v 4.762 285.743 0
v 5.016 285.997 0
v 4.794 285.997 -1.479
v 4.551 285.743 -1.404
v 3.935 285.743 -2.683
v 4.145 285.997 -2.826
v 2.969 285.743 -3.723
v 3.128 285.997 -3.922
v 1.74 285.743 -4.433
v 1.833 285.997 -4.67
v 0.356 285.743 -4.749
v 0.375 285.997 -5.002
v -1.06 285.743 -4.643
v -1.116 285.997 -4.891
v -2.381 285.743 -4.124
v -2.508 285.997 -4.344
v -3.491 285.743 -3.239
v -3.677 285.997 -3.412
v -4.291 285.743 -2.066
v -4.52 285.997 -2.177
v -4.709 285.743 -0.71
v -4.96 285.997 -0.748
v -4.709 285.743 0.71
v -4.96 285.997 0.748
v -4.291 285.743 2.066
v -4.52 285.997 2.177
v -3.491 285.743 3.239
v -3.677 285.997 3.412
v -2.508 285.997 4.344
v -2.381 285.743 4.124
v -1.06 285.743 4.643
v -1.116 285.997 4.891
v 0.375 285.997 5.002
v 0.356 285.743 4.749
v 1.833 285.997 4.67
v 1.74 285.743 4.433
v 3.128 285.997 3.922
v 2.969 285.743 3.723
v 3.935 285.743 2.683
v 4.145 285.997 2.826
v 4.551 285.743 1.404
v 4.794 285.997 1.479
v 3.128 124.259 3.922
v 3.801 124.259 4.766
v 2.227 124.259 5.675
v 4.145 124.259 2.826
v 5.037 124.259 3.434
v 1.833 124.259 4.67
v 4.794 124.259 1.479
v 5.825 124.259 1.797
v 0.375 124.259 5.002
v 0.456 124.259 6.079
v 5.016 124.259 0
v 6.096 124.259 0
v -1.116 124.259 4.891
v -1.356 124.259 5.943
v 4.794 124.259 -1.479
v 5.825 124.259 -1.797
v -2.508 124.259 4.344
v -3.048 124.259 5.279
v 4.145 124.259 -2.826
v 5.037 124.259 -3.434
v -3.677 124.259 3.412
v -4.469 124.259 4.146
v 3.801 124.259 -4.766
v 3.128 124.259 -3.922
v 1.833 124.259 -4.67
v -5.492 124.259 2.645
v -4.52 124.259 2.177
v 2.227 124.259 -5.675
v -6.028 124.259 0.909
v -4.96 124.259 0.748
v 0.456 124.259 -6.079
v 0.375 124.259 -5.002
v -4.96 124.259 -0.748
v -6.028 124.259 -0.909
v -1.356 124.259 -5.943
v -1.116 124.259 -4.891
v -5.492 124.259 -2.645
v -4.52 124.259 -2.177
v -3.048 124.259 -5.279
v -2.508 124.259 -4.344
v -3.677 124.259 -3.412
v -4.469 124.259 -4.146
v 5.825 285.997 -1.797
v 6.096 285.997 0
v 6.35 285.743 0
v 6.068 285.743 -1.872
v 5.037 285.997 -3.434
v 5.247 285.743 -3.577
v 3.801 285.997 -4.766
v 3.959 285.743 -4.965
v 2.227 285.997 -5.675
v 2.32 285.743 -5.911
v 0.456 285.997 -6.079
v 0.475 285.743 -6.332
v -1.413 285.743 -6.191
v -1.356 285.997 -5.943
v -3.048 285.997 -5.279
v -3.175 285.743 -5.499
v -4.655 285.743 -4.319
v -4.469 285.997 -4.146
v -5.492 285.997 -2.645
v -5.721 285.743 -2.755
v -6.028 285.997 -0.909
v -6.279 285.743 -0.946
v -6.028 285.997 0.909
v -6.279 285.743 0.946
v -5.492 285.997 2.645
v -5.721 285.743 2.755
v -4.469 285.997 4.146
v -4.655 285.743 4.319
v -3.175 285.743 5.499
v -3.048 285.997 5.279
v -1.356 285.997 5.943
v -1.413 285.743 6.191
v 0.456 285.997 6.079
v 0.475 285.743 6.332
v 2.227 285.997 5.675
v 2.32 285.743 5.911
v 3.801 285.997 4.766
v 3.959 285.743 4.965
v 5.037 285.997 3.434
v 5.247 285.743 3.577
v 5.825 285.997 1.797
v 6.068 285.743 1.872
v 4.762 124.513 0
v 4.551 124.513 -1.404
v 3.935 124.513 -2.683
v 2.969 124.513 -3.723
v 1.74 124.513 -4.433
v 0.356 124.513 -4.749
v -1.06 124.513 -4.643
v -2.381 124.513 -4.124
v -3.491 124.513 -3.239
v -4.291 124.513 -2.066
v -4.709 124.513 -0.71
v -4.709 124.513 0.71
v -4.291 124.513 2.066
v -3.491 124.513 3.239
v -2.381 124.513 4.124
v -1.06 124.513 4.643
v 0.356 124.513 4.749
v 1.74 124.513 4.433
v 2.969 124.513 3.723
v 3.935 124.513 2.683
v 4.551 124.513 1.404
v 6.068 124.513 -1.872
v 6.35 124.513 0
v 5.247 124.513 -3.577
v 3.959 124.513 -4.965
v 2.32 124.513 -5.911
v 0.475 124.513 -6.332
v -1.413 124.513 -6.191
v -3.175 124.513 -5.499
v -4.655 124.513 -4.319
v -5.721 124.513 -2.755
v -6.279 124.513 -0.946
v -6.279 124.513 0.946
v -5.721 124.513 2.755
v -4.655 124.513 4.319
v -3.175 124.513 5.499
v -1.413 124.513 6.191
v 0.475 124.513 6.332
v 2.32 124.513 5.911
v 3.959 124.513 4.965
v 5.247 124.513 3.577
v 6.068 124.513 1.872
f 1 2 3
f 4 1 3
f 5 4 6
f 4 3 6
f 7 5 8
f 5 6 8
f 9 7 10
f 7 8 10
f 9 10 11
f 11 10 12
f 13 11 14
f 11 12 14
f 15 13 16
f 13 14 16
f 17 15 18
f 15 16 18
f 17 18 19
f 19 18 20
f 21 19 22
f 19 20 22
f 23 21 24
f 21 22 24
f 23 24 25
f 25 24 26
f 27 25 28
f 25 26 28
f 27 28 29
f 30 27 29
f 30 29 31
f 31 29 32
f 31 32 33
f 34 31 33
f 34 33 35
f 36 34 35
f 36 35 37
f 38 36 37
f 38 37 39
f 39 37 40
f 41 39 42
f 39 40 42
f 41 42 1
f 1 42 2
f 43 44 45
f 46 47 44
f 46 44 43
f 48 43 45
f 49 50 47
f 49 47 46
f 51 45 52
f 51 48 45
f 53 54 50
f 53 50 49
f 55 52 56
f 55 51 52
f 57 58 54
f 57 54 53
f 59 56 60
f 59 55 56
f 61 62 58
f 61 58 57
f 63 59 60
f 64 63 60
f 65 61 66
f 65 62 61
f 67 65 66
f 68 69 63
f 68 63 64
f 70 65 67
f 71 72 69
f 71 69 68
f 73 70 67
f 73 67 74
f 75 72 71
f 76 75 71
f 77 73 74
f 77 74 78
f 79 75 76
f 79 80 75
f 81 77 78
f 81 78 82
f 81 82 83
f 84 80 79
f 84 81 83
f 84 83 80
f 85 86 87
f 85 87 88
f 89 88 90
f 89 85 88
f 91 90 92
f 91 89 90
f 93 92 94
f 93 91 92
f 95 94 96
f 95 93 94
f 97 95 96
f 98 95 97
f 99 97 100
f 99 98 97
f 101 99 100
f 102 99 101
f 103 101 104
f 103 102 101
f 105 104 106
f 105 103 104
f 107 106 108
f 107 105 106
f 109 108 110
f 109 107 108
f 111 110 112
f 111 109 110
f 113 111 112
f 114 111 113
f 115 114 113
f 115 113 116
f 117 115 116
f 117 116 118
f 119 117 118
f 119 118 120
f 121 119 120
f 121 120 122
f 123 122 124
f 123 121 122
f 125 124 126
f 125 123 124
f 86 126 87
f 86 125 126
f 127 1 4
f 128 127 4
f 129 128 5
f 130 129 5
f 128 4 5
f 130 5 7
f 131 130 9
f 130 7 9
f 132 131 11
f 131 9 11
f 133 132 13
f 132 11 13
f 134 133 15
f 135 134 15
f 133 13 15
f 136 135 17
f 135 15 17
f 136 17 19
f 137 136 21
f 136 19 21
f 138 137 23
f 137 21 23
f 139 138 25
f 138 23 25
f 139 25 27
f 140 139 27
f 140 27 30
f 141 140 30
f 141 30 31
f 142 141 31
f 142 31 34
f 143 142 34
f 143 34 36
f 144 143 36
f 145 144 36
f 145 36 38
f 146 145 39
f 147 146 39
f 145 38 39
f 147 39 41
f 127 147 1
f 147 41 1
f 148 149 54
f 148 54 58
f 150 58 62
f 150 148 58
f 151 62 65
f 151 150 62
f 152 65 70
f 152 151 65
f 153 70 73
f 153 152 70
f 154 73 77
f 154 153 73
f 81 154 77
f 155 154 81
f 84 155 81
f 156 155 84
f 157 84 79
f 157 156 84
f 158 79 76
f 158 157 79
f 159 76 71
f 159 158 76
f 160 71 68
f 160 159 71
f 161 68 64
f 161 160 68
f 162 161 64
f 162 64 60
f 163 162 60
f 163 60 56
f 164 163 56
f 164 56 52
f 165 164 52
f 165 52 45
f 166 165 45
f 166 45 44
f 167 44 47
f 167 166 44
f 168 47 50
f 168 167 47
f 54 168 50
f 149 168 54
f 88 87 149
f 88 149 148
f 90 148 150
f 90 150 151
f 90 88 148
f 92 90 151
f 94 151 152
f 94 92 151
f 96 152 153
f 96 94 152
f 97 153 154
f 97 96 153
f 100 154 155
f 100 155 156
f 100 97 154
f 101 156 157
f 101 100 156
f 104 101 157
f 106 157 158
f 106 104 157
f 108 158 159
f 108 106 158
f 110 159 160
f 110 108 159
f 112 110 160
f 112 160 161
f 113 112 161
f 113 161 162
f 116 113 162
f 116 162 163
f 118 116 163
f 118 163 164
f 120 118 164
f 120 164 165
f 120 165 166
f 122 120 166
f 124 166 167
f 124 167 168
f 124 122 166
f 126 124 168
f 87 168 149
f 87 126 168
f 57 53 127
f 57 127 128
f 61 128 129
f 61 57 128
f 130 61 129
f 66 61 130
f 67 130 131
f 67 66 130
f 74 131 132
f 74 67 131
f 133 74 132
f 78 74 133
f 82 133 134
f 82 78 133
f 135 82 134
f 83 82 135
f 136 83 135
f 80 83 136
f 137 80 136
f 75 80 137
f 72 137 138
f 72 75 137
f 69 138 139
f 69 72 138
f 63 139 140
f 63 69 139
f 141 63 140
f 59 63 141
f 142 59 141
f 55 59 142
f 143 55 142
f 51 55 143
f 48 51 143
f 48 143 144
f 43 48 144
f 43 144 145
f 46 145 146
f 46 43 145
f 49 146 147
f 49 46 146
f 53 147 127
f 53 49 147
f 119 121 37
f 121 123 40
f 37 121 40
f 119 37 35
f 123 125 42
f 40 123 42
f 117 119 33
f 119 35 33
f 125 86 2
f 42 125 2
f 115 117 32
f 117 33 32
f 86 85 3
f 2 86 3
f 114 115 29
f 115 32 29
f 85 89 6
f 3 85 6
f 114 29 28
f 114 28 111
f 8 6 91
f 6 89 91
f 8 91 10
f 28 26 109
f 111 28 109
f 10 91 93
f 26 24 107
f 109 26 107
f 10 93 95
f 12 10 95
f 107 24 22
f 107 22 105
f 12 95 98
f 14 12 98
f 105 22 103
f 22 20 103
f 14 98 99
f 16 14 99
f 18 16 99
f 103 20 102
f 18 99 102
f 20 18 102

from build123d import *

# Parameters (mm, degrees)
SKETCH1_W     = 1.5875
SKETCH1_H     = 161.737331671
CHAMFER1_SIZE = 0.254


with BuildPart() as part:
    # Sketch1 → Revolve1 (revolve)
    with BuildSketch(Plane.XY):
        with Locations((5.55625, 205.12785438)):
            Rectangle(SKETCH1_W, SKETCH1_H)
    revolve(axis=Axis((0, 114.734188544, 0), (0, 1, 0)))

    # Chamfer1
    chamfer1_edges = [part.edges().sort_by_distance(p)[0] for p in [
        (-6.35, 124.259188544, 0),
        (-6.349999999, 285.996520215, 0),
        (-4.762499999, 285.996520215, 0),
        (-4.7625, 124.259188544, 0),
    ]]
    chamfer(chamfer1_edges, length=CHAMFER1_SIZE)


solid = part.part
